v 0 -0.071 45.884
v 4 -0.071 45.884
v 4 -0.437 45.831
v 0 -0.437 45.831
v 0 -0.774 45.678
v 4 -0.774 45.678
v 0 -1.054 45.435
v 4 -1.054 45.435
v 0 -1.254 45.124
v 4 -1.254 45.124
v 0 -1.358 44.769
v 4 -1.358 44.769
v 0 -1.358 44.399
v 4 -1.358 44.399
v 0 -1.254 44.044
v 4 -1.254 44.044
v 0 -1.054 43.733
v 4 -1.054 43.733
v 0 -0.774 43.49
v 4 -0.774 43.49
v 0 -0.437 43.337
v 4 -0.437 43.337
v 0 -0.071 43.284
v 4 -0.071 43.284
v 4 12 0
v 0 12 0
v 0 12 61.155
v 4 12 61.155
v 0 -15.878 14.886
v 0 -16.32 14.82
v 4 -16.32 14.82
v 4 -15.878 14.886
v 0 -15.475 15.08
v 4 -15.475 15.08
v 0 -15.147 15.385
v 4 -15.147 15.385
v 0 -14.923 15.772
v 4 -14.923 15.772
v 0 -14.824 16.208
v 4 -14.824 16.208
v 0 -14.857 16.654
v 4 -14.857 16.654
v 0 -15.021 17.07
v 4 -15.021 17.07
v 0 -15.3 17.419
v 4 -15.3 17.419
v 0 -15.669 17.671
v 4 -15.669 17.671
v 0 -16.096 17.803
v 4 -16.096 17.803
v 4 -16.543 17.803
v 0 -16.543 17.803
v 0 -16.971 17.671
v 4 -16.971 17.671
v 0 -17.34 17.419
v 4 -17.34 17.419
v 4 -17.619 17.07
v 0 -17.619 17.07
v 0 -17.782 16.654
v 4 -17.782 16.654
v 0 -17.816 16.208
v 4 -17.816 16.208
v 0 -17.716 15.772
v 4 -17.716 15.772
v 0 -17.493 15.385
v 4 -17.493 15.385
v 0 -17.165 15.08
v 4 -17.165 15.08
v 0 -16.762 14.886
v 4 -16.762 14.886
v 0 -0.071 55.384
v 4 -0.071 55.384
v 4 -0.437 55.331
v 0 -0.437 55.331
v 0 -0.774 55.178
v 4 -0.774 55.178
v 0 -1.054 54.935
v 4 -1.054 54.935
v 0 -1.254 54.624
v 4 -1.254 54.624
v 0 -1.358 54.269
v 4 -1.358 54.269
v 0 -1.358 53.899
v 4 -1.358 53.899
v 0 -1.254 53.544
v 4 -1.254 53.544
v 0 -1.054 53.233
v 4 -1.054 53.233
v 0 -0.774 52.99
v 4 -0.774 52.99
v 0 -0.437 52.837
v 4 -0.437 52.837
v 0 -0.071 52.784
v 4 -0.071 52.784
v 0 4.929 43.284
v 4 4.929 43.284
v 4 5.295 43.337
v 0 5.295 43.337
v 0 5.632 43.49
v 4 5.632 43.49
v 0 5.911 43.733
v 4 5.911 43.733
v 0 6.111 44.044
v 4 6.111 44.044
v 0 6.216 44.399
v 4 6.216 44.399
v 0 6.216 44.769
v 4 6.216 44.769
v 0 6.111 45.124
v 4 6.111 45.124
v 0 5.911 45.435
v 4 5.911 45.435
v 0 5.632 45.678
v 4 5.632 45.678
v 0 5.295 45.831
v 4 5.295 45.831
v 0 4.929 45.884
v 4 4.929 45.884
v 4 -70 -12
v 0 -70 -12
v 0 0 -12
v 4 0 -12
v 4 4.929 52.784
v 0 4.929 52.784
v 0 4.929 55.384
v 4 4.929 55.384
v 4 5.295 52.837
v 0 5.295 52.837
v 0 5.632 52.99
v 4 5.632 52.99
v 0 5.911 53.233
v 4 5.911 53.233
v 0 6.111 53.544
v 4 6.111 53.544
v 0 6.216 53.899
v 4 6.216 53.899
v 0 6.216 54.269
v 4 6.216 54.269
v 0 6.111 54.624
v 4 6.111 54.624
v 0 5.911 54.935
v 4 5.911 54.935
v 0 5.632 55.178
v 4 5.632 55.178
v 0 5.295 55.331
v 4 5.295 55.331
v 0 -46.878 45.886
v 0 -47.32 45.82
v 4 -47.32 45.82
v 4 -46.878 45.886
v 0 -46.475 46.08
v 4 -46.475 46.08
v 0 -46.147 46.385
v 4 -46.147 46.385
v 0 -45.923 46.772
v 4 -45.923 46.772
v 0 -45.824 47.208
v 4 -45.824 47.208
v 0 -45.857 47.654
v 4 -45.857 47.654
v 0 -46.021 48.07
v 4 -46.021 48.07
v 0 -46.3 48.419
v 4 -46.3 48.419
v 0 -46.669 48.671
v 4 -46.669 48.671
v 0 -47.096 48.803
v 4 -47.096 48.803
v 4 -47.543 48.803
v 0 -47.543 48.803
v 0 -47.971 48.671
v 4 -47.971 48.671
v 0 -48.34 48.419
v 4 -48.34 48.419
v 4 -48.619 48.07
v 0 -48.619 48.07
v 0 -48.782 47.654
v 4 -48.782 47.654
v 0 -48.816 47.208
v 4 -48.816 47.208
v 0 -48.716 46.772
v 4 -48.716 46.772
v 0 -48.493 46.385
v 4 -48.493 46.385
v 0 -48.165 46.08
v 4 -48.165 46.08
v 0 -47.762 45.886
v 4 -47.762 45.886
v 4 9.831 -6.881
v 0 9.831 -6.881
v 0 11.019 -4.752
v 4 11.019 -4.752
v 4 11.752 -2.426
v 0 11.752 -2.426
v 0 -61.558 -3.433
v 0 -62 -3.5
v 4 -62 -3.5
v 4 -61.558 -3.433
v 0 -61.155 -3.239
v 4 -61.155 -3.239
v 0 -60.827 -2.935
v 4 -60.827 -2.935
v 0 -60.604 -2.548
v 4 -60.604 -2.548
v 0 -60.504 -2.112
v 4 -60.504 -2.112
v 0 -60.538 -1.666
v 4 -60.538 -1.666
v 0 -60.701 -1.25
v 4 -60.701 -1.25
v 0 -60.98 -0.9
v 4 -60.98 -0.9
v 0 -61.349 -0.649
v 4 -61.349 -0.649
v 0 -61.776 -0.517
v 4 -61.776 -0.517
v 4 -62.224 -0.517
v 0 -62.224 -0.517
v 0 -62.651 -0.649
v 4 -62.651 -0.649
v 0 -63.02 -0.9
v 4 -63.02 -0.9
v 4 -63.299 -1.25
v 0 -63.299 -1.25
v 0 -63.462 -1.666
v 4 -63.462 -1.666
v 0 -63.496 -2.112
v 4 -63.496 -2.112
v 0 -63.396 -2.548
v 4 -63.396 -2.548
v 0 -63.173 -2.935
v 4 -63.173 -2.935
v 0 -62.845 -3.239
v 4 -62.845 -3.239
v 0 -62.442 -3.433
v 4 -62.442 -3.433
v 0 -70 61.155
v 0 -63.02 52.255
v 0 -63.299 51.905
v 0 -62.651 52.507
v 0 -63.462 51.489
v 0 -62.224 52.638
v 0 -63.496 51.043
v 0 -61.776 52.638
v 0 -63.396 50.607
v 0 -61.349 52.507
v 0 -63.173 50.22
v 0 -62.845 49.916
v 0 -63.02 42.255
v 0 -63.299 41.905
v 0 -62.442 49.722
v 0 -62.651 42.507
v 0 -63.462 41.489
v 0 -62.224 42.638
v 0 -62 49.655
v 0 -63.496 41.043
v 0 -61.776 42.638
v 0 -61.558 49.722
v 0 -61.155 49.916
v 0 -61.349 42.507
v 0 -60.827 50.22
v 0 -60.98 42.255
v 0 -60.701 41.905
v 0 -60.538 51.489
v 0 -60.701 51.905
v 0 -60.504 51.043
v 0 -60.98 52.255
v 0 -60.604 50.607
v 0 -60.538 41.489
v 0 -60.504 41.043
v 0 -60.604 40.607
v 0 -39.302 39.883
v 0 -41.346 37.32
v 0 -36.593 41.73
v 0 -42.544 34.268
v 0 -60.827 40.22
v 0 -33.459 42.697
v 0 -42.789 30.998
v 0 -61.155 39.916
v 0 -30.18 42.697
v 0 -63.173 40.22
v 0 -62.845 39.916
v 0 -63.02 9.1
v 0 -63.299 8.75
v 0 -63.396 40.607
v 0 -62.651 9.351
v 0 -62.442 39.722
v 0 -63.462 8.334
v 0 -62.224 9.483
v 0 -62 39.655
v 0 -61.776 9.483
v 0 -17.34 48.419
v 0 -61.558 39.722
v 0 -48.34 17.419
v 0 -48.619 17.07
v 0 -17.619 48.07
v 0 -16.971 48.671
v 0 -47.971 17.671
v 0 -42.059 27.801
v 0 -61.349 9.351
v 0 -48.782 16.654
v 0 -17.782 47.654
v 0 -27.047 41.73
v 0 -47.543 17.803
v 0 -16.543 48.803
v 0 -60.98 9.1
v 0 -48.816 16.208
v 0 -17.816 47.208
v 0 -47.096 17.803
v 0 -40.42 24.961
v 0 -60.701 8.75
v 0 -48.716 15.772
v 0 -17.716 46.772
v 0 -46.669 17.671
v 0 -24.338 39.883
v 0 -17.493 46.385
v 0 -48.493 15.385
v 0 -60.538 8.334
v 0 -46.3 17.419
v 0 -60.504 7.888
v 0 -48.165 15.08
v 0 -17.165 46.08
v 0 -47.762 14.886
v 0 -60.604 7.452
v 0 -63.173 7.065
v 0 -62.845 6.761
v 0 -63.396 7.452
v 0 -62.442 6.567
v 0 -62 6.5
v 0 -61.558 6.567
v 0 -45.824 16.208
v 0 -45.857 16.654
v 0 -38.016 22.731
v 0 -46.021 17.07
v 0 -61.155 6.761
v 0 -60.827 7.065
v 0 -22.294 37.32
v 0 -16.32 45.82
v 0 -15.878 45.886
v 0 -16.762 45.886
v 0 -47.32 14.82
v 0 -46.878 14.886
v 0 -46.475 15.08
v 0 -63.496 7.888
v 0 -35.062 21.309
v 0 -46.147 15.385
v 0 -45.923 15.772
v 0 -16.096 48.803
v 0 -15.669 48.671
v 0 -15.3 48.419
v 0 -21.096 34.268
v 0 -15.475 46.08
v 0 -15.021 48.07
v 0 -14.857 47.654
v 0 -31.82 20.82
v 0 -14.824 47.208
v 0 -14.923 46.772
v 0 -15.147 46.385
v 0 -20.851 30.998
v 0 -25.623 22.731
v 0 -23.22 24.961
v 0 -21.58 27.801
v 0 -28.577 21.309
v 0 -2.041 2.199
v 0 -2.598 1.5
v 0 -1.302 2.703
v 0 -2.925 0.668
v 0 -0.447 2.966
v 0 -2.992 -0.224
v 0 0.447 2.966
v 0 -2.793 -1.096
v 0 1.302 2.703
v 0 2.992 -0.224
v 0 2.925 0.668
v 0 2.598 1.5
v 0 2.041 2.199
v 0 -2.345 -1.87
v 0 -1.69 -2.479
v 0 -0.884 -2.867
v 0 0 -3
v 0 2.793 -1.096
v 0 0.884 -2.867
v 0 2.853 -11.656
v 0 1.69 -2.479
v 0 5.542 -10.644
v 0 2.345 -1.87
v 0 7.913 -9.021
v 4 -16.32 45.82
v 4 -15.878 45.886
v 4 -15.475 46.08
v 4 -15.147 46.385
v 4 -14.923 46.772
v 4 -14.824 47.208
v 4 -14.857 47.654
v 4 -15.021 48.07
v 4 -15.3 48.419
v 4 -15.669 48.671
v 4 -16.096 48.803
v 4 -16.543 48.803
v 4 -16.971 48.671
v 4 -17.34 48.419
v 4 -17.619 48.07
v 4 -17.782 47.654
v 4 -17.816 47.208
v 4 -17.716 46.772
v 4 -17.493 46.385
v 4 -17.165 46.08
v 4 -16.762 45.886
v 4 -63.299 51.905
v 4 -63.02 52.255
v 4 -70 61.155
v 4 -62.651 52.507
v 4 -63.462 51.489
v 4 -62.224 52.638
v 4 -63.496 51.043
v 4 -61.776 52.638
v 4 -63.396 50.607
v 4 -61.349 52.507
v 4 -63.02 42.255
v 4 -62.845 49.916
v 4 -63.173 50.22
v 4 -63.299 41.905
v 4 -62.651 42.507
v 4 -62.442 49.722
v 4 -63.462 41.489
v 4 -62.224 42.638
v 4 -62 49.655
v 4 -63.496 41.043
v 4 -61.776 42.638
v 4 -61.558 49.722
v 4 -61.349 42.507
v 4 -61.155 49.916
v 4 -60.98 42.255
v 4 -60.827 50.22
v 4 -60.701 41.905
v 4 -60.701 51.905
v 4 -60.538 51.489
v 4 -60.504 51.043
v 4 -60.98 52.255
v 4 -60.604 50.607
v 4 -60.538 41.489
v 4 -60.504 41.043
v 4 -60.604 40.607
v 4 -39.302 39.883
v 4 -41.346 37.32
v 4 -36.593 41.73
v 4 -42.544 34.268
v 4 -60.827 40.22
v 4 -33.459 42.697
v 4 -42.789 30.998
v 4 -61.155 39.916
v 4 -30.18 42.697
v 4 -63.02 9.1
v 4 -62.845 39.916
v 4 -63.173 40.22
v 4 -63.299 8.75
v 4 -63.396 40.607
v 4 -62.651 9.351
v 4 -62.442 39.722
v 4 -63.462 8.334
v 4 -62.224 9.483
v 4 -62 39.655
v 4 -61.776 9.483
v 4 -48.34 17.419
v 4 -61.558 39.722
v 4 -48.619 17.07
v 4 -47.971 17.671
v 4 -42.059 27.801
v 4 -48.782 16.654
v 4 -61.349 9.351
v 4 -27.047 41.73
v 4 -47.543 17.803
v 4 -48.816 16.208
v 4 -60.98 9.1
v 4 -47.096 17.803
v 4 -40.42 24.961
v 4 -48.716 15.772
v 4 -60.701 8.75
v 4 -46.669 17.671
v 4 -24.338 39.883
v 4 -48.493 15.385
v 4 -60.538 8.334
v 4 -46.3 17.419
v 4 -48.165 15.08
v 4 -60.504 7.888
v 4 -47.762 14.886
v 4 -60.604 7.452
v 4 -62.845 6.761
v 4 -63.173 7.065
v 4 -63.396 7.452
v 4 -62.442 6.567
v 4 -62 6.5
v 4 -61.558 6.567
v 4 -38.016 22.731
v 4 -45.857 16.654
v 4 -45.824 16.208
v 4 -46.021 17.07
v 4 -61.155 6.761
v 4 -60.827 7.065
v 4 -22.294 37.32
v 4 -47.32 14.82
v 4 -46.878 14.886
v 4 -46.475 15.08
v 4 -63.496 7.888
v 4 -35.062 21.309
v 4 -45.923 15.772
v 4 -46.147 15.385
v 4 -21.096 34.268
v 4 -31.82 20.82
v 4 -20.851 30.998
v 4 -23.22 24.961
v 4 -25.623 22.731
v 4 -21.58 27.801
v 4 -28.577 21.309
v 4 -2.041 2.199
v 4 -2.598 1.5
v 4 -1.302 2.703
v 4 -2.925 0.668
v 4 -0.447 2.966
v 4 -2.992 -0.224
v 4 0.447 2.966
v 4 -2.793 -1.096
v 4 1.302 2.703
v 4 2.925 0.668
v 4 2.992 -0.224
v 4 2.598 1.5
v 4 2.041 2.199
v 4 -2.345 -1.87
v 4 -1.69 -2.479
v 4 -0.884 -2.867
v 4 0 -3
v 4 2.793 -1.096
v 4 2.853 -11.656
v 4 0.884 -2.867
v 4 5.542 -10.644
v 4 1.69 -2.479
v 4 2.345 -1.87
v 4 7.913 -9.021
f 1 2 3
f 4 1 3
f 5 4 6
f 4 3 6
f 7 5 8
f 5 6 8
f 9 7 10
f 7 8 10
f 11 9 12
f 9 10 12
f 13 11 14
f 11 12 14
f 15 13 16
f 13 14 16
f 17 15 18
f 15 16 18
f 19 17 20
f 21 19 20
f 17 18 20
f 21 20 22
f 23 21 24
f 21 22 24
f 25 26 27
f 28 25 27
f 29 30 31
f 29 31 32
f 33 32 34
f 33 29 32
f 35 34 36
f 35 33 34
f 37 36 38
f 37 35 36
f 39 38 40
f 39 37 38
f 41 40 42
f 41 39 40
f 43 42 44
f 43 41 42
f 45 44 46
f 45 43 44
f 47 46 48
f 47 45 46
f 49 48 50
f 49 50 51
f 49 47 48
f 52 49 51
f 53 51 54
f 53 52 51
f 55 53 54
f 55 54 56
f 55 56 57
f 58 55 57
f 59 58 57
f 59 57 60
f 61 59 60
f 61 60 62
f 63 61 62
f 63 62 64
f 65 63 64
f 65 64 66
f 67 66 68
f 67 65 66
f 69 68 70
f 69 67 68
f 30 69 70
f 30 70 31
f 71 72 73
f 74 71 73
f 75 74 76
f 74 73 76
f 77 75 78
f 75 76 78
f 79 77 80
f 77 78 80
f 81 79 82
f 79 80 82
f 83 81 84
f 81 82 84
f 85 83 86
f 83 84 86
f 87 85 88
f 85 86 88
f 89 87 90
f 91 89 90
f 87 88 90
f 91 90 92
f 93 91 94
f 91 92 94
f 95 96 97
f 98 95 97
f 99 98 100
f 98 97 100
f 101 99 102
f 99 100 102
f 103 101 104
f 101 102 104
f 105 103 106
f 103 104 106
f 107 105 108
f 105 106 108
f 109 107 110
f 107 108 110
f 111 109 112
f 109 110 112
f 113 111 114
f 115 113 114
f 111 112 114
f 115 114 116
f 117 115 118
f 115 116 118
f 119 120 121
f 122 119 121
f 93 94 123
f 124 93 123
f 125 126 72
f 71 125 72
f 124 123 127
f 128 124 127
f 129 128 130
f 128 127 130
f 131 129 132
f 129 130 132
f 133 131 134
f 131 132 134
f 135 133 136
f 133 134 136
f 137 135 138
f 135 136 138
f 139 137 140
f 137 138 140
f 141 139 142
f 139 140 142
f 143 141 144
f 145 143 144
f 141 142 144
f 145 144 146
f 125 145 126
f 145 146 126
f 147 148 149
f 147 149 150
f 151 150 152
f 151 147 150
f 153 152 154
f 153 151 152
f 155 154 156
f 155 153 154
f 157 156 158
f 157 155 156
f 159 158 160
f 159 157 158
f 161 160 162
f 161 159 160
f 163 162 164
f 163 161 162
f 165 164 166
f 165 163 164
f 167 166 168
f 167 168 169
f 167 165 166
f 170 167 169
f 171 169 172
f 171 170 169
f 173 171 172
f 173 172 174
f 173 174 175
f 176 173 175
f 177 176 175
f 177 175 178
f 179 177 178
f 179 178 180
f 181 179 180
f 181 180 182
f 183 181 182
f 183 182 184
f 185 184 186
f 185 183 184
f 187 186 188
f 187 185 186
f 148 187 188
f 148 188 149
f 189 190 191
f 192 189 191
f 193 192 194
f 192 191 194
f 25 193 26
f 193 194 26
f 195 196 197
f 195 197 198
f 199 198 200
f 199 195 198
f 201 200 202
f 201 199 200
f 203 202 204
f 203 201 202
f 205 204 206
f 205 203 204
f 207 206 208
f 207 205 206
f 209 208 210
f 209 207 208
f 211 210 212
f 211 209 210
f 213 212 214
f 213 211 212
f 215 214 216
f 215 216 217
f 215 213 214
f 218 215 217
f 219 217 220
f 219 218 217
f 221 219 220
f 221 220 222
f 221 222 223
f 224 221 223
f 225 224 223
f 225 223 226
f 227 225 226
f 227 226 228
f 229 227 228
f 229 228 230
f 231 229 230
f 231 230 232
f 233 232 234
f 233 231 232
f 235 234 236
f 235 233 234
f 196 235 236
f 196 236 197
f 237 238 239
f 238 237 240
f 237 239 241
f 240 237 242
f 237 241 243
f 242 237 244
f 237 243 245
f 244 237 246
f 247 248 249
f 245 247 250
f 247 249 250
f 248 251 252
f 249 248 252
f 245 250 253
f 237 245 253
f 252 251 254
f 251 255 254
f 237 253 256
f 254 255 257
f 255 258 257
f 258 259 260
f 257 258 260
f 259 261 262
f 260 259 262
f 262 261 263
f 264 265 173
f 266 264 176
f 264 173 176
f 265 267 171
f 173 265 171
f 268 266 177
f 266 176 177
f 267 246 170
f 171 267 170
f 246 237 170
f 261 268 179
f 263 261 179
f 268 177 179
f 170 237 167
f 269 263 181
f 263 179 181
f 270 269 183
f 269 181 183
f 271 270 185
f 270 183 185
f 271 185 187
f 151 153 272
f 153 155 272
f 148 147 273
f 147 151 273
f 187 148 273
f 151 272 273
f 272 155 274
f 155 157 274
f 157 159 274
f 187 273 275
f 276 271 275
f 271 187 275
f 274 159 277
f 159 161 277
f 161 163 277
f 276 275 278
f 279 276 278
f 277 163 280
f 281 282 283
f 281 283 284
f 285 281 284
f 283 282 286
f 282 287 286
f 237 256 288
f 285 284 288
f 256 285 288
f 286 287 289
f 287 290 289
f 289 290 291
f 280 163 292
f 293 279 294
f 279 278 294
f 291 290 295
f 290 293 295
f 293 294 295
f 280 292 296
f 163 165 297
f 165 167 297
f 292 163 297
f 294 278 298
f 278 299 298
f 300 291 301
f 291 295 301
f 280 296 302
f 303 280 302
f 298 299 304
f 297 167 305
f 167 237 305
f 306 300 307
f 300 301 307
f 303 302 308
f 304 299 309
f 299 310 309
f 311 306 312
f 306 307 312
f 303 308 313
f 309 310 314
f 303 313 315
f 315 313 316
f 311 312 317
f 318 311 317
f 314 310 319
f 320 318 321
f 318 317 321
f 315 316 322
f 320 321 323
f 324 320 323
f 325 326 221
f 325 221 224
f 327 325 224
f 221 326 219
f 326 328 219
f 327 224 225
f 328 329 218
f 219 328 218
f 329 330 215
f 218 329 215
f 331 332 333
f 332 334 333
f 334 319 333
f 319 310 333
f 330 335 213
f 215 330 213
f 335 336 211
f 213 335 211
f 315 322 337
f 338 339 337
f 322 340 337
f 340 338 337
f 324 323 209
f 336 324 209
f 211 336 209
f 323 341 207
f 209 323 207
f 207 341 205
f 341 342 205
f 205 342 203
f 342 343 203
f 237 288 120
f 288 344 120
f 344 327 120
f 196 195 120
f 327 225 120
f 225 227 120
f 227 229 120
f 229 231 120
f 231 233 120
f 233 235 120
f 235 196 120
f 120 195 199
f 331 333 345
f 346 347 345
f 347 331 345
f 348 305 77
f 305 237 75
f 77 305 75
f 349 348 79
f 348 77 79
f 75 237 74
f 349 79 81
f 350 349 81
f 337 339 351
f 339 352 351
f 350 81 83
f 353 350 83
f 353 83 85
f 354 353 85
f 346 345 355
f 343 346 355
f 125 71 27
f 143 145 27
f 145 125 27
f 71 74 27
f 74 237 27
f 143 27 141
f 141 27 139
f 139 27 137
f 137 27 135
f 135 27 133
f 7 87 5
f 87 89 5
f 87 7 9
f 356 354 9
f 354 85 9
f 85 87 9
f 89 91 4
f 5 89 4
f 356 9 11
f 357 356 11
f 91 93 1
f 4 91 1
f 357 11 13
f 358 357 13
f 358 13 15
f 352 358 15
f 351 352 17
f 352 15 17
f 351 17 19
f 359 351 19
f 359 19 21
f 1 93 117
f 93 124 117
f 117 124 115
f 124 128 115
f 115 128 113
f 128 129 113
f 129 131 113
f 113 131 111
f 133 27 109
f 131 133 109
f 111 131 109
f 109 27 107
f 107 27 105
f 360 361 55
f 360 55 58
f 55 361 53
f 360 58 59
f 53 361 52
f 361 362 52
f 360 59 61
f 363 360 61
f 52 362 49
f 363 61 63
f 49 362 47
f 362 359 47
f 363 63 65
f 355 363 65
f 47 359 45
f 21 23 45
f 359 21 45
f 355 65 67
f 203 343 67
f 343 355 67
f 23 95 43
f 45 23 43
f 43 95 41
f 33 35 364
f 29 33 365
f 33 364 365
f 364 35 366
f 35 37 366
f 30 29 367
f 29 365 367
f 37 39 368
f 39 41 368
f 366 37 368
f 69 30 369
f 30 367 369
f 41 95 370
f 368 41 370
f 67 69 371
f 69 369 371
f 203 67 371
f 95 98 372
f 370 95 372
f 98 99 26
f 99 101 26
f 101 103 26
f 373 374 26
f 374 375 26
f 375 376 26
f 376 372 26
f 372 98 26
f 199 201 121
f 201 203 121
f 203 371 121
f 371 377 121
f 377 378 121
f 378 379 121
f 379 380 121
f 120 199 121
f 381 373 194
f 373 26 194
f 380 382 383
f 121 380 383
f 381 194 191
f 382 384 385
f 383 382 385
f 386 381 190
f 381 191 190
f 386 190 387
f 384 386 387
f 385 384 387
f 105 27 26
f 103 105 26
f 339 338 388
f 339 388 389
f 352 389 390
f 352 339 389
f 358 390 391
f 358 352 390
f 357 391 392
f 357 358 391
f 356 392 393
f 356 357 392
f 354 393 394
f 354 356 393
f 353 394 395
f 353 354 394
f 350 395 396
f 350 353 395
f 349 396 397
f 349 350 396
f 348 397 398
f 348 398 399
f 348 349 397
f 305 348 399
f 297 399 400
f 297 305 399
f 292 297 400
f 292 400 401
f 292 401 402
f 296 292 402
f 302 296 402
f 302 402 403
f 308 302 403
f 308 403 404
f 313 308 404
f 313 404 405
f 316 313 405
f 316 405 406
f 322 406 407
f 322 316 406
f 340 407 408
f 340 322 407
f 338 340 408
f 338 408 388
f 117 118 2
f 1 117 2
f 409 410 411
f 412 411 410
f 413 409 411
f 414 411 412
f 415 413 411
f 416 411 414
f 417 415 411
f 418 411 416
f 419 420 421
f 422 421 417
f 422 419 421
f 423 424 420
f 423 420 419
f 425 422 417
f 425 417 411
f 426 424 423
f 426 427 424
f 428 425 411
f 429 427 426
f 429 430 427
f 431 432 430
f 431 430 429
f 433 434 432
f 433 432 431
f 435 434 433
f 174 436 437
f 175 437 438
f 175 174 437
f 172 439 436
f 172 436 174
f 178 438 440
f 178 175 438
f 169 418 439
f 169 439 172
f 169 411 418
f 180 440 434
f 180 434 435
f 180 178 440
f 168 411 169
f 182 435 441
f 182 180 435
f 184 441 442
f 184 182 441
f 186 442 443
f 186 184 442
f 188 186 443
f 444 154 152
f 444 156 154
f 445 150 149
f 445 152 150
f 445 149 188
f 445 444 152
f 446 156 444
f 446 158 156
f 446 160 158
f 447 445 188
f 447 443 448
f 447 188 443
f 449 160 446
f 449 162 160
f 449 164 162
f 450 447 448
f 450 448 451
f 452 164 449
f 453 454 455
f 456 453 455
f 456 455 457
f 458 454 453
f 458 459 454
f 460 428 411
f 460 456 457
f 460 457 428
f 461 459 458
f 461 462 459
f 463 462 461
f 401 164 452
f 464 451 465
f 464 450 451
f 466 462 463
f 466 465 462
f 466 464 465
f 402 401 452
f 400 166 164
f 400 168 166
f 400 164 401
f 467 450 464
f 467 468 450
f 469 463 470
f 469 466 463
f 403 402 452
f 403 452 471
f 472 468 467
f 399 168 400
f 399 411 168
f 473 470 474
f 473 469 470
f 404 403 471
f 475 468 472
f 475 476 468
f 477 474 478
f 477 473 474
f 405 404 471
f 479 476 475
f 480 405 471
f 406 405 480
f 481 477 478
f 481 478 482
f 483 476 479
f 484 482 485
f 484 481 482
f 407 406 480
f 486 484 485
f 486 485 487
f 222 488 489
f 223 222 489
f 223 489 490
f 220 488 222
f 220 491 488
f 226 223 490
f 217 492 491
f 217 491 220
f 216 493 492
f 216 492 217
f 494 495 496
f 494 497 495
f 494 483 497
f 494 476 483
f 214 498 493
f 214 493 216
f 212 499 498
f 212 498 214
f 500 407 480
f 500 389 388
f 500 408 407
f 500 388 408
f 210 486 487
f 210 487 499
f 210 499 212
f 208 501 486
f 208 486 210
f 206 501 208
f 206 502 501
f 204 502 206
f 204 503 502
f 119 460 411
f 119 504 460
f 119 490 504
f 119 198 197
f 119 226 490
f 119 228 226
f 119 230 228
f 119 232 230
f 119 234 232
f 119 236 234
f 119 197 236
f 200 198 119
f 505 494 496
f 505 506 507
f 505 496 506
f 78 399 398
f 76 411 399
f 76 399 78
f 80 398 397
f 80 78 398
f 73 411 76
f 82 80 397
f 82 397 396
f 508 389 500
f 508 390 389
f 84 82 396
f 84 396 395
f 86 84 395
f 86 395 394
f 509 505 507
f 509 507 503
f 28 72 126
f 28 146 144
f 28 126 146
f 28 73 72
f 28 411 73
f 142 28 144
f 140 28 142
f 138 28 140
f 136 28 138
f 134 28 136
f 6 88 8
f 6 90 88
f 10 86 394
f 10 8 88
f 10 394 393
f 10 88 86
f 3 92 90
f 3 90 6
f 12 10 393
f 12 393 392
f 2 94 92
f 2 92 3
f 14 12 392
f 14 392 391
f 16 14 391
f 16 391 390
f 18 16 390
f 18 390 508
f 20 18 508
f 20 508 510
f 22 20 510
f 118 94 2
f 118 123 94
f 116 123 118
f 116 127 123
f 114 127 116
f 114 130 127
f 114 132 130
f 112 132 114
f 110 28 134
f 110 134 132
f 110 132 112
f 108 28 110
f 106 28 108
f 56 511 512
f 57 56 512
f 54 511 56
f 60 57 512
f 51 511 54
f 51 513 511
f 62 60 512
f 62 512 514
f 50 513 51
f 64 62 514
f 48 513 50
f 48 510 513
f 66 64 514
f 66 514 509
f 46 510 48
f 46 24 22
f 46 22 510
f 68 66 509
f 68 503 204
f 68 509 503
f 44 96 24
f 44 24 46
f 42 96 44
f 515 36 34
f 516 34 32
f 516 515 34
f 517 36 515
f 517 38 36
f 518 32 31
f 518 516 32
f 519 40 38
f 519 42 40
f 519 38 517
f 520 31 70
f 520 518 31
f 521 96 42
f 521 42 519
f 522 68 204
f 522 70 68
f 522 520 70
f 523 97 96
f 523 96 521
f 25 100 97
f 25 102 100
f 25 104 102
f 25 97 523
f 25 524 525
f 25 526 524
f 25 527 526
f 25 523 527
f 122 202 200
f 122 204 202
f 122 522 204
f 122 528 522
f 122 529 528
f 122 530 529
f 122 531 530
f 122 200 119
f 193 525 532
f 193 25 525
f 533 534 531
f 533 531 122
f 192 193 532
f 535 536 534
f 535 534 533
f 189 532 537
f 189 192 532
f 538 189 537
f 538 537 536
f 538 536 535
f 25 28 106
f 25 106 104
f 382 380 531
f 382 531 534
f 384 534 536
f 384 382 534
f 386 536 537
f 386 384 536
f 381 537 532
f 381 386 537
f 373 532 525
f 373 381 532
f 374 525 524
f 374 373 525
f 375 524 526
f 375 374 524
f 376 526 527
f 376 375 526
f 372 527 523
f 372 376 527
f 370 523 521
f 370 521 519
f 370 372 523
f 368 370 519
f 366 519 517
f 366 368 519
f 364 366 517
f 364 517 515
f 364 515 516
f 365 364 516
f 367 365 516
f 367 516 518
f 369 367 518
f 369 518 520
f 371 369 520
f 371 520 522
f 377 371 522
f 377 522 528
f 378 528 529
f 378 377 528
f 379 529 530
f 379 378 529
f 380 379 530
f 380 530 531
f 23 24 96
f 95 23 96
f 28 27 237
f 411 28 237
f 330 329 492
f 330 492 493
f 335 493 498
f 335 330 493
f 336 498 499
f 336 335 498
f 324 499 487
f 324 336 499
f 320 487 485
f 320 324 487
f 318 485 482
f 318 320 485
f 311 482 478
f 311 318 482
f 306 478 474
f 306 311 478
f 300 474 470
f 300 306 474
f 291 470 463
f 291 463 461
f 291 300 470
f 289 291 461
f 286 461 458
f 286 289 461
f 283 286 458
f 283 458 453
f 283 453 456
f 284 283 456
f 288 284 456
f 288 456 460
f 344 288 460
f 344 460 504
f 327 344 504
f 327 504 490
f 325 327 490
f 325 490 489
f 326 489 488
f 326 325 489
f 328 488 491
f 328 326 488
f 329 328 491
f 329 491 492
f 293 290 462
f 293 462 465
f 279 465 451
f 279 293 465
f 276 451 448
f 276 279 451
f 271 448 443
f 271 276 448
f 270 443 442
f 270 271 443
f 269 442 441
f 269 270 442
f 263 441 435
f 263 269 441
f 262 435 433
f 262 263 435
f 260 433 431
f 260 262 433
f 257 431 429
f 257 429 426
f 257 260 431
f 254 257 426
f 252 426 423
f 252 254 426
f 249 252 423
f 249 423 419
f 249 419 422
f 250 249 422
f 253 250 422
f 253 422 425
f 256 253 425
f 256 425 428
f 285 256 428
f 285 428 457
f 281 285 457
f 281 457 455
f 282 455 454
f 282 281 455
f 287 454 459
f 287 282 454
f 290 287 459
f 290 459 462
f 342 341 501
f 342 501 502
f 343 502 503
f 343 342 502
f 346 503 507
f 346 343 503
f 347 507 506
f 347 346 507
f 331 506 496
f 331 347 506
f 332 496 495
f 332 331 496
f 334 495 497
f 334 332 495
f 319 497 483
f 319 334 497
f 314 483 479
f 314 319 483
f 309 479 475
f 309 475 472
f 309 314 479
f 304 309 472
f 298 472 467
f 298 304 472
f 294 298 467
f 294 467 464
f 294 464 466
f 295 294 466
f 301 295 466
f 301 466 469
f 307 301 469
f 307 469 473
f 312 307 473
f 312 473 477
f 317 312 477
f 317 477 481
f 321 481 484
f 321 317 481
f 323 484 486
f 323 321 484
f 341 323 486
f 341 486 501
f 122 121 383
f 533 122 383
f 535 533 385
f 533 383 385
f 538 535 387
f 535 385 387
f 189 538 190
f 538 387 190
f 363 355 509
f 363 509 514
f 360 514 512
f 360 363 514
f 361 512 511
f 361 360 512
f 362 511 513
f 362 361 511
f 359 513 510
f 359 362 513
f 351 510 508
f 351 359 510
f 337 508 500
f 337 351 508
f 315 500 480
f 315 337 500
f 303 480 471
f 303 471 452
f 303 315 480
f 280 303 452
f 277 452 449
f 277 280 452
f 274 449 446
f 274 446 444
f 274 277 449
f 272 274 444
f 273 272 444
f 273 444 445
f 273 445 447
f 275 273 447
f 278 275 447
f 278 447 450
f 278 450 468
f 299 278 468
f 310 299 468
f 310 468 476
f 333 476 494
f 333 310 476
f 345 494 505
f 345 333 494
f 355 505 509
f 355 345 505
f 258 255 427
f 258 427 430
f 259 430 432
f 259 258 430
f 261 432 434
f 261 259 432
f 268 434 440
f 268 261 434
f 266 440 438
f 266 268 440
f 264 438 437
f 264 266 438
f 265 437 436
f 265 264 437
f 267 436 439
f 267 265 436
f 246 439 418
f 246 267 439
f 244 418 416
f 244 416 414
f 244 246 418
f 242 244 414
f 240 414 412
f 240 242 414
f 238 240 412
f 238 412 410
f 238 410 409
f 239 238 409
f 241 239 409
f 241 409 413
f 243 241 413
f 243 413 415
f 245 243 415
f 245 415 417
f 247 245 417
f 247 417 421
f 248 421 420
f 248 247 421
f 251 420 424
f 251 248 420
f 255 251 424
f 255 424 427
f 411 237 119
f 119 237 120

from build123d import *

# Parameters (mm, degrees)
SKETCH_1_R          = 1.5
SKETCH_1_R_2        = 11
SKETCH_1_R_3        = 3
EXTRUDE_1_DEPTH     = 4
CUT_EXTRUDE_1_DEPTH = 10


with BuildPart() as part:
    # 草图1 → 凸台-拉伸1 (new body)
    with BuildSketch(Plane(origin=(0, 0, 0), x_dir=(0, 0, -1), z_dir=(1, 0, 0))):
        with BuildLine():
            Line((-61.155133648, -62), (-61.155133648, -70))
            Line((-61.155133648, -70), (12, -70))
            Line((12, -70), (12, -62))
            Line((12, -62), (12, 0))
            ThreePointArc((12, 0), (10.643645992, 5.541913027), (6.8812, 9.83102673))
            ThreePointArc((6.8812, 9.83102673), (3.607469975, 11.44491854), (0, 12))
            Line((0, 12), (-61.155133648, 12))
            Line((-61.155133648, 12), (-61.155133648, -62))
        make_face()
        with Locations((-51.155133648, -62)):
            Circle(SKETCH_1_R, mode=Mode.SUBTRACT)
        with Locations((-41.155133648, -62)):
            Circle(SKETCH_1_R, mode=Mode.SUBTRACT)
        with Locations((-47.319805147, -47.319805147)):
            Circle(SKETCH_1_R, mode=Mode.SUBTRACT)
        with Locations((-31.819805153, -31.819805153)):
            Circle(SKETCH_1_R_2, mode=Mode.SUBTRACT)
        with Locations((-8, -62)):
            Circle(SKETCH_1_R, mode=Mode.SUBTRACT)
        with Locations((2, -62)):
            Circle(SKETCH_1_R, mode=Mode.SUBTRACT)
        with Locations((-16.319805153, -47.319805147)):
            Circle(SKETCH_1_R, mode=Mode.SUBTRACT)
        with Locations((-47.319805147, -16.319805153)):
            Circle(SKETCH_1_R, mode=Mode.SUBTRACT)
        with Locations((-16.319805153, -16.319805153)):
            Circle(SKETCH_1_R, mode=Mode.SUBTRACT)
        Circle(SKETCH_1_R_3, mode=Mode.SUBTRACT)
    extrude(amount=EXTRUDE_1_DEPTH)

    # 草图2 → 切除-拉伸1 (cut)
    with BuildSketch(Plane(origin=(4, 0, 0), x_dir=(0, 0, -1), z_dir=(1, 0, 0))):
        with BuildLine():
            Line((-55.384065837, 4.928932188), (-55.384065837, -0.071067812))
            ThreePointArc((-55.384065837, -0.071067812), (-54.084065837, -1.371067812), (-52.784065837, -0.071067812))
            Line((-52.784065837, -0.071067812), (-52.784065837, 4.928932188))
            ThreePointArc((-52.784065837, 4.928932188), (-54.084065837, 6.228932188), (-55.384065837, 4.928932188))
        make_face()
        with BuildLine():
            Line((-45.884065837, 4.928932188), (-45.884065837, -0.071067812))
            ThreePointArc((-45.884065837, -0.071067812), (-44.584065837, -1.371067812), (-43.284065837, -0.071067812))
            Line((-43.284065837, -0.071067812), (-43.284065837, 4.928932188))
            ThreePointArc((-43.284065837, 4.928932188), (-44.584065837, 6.228932188), (-45.884065837, 4.928932188))
        make_face()
    extrude(amount=-CUT_EXTRUDE_1_DEPTH, mode=Mode.SUBTRACT)


solid = part.part
